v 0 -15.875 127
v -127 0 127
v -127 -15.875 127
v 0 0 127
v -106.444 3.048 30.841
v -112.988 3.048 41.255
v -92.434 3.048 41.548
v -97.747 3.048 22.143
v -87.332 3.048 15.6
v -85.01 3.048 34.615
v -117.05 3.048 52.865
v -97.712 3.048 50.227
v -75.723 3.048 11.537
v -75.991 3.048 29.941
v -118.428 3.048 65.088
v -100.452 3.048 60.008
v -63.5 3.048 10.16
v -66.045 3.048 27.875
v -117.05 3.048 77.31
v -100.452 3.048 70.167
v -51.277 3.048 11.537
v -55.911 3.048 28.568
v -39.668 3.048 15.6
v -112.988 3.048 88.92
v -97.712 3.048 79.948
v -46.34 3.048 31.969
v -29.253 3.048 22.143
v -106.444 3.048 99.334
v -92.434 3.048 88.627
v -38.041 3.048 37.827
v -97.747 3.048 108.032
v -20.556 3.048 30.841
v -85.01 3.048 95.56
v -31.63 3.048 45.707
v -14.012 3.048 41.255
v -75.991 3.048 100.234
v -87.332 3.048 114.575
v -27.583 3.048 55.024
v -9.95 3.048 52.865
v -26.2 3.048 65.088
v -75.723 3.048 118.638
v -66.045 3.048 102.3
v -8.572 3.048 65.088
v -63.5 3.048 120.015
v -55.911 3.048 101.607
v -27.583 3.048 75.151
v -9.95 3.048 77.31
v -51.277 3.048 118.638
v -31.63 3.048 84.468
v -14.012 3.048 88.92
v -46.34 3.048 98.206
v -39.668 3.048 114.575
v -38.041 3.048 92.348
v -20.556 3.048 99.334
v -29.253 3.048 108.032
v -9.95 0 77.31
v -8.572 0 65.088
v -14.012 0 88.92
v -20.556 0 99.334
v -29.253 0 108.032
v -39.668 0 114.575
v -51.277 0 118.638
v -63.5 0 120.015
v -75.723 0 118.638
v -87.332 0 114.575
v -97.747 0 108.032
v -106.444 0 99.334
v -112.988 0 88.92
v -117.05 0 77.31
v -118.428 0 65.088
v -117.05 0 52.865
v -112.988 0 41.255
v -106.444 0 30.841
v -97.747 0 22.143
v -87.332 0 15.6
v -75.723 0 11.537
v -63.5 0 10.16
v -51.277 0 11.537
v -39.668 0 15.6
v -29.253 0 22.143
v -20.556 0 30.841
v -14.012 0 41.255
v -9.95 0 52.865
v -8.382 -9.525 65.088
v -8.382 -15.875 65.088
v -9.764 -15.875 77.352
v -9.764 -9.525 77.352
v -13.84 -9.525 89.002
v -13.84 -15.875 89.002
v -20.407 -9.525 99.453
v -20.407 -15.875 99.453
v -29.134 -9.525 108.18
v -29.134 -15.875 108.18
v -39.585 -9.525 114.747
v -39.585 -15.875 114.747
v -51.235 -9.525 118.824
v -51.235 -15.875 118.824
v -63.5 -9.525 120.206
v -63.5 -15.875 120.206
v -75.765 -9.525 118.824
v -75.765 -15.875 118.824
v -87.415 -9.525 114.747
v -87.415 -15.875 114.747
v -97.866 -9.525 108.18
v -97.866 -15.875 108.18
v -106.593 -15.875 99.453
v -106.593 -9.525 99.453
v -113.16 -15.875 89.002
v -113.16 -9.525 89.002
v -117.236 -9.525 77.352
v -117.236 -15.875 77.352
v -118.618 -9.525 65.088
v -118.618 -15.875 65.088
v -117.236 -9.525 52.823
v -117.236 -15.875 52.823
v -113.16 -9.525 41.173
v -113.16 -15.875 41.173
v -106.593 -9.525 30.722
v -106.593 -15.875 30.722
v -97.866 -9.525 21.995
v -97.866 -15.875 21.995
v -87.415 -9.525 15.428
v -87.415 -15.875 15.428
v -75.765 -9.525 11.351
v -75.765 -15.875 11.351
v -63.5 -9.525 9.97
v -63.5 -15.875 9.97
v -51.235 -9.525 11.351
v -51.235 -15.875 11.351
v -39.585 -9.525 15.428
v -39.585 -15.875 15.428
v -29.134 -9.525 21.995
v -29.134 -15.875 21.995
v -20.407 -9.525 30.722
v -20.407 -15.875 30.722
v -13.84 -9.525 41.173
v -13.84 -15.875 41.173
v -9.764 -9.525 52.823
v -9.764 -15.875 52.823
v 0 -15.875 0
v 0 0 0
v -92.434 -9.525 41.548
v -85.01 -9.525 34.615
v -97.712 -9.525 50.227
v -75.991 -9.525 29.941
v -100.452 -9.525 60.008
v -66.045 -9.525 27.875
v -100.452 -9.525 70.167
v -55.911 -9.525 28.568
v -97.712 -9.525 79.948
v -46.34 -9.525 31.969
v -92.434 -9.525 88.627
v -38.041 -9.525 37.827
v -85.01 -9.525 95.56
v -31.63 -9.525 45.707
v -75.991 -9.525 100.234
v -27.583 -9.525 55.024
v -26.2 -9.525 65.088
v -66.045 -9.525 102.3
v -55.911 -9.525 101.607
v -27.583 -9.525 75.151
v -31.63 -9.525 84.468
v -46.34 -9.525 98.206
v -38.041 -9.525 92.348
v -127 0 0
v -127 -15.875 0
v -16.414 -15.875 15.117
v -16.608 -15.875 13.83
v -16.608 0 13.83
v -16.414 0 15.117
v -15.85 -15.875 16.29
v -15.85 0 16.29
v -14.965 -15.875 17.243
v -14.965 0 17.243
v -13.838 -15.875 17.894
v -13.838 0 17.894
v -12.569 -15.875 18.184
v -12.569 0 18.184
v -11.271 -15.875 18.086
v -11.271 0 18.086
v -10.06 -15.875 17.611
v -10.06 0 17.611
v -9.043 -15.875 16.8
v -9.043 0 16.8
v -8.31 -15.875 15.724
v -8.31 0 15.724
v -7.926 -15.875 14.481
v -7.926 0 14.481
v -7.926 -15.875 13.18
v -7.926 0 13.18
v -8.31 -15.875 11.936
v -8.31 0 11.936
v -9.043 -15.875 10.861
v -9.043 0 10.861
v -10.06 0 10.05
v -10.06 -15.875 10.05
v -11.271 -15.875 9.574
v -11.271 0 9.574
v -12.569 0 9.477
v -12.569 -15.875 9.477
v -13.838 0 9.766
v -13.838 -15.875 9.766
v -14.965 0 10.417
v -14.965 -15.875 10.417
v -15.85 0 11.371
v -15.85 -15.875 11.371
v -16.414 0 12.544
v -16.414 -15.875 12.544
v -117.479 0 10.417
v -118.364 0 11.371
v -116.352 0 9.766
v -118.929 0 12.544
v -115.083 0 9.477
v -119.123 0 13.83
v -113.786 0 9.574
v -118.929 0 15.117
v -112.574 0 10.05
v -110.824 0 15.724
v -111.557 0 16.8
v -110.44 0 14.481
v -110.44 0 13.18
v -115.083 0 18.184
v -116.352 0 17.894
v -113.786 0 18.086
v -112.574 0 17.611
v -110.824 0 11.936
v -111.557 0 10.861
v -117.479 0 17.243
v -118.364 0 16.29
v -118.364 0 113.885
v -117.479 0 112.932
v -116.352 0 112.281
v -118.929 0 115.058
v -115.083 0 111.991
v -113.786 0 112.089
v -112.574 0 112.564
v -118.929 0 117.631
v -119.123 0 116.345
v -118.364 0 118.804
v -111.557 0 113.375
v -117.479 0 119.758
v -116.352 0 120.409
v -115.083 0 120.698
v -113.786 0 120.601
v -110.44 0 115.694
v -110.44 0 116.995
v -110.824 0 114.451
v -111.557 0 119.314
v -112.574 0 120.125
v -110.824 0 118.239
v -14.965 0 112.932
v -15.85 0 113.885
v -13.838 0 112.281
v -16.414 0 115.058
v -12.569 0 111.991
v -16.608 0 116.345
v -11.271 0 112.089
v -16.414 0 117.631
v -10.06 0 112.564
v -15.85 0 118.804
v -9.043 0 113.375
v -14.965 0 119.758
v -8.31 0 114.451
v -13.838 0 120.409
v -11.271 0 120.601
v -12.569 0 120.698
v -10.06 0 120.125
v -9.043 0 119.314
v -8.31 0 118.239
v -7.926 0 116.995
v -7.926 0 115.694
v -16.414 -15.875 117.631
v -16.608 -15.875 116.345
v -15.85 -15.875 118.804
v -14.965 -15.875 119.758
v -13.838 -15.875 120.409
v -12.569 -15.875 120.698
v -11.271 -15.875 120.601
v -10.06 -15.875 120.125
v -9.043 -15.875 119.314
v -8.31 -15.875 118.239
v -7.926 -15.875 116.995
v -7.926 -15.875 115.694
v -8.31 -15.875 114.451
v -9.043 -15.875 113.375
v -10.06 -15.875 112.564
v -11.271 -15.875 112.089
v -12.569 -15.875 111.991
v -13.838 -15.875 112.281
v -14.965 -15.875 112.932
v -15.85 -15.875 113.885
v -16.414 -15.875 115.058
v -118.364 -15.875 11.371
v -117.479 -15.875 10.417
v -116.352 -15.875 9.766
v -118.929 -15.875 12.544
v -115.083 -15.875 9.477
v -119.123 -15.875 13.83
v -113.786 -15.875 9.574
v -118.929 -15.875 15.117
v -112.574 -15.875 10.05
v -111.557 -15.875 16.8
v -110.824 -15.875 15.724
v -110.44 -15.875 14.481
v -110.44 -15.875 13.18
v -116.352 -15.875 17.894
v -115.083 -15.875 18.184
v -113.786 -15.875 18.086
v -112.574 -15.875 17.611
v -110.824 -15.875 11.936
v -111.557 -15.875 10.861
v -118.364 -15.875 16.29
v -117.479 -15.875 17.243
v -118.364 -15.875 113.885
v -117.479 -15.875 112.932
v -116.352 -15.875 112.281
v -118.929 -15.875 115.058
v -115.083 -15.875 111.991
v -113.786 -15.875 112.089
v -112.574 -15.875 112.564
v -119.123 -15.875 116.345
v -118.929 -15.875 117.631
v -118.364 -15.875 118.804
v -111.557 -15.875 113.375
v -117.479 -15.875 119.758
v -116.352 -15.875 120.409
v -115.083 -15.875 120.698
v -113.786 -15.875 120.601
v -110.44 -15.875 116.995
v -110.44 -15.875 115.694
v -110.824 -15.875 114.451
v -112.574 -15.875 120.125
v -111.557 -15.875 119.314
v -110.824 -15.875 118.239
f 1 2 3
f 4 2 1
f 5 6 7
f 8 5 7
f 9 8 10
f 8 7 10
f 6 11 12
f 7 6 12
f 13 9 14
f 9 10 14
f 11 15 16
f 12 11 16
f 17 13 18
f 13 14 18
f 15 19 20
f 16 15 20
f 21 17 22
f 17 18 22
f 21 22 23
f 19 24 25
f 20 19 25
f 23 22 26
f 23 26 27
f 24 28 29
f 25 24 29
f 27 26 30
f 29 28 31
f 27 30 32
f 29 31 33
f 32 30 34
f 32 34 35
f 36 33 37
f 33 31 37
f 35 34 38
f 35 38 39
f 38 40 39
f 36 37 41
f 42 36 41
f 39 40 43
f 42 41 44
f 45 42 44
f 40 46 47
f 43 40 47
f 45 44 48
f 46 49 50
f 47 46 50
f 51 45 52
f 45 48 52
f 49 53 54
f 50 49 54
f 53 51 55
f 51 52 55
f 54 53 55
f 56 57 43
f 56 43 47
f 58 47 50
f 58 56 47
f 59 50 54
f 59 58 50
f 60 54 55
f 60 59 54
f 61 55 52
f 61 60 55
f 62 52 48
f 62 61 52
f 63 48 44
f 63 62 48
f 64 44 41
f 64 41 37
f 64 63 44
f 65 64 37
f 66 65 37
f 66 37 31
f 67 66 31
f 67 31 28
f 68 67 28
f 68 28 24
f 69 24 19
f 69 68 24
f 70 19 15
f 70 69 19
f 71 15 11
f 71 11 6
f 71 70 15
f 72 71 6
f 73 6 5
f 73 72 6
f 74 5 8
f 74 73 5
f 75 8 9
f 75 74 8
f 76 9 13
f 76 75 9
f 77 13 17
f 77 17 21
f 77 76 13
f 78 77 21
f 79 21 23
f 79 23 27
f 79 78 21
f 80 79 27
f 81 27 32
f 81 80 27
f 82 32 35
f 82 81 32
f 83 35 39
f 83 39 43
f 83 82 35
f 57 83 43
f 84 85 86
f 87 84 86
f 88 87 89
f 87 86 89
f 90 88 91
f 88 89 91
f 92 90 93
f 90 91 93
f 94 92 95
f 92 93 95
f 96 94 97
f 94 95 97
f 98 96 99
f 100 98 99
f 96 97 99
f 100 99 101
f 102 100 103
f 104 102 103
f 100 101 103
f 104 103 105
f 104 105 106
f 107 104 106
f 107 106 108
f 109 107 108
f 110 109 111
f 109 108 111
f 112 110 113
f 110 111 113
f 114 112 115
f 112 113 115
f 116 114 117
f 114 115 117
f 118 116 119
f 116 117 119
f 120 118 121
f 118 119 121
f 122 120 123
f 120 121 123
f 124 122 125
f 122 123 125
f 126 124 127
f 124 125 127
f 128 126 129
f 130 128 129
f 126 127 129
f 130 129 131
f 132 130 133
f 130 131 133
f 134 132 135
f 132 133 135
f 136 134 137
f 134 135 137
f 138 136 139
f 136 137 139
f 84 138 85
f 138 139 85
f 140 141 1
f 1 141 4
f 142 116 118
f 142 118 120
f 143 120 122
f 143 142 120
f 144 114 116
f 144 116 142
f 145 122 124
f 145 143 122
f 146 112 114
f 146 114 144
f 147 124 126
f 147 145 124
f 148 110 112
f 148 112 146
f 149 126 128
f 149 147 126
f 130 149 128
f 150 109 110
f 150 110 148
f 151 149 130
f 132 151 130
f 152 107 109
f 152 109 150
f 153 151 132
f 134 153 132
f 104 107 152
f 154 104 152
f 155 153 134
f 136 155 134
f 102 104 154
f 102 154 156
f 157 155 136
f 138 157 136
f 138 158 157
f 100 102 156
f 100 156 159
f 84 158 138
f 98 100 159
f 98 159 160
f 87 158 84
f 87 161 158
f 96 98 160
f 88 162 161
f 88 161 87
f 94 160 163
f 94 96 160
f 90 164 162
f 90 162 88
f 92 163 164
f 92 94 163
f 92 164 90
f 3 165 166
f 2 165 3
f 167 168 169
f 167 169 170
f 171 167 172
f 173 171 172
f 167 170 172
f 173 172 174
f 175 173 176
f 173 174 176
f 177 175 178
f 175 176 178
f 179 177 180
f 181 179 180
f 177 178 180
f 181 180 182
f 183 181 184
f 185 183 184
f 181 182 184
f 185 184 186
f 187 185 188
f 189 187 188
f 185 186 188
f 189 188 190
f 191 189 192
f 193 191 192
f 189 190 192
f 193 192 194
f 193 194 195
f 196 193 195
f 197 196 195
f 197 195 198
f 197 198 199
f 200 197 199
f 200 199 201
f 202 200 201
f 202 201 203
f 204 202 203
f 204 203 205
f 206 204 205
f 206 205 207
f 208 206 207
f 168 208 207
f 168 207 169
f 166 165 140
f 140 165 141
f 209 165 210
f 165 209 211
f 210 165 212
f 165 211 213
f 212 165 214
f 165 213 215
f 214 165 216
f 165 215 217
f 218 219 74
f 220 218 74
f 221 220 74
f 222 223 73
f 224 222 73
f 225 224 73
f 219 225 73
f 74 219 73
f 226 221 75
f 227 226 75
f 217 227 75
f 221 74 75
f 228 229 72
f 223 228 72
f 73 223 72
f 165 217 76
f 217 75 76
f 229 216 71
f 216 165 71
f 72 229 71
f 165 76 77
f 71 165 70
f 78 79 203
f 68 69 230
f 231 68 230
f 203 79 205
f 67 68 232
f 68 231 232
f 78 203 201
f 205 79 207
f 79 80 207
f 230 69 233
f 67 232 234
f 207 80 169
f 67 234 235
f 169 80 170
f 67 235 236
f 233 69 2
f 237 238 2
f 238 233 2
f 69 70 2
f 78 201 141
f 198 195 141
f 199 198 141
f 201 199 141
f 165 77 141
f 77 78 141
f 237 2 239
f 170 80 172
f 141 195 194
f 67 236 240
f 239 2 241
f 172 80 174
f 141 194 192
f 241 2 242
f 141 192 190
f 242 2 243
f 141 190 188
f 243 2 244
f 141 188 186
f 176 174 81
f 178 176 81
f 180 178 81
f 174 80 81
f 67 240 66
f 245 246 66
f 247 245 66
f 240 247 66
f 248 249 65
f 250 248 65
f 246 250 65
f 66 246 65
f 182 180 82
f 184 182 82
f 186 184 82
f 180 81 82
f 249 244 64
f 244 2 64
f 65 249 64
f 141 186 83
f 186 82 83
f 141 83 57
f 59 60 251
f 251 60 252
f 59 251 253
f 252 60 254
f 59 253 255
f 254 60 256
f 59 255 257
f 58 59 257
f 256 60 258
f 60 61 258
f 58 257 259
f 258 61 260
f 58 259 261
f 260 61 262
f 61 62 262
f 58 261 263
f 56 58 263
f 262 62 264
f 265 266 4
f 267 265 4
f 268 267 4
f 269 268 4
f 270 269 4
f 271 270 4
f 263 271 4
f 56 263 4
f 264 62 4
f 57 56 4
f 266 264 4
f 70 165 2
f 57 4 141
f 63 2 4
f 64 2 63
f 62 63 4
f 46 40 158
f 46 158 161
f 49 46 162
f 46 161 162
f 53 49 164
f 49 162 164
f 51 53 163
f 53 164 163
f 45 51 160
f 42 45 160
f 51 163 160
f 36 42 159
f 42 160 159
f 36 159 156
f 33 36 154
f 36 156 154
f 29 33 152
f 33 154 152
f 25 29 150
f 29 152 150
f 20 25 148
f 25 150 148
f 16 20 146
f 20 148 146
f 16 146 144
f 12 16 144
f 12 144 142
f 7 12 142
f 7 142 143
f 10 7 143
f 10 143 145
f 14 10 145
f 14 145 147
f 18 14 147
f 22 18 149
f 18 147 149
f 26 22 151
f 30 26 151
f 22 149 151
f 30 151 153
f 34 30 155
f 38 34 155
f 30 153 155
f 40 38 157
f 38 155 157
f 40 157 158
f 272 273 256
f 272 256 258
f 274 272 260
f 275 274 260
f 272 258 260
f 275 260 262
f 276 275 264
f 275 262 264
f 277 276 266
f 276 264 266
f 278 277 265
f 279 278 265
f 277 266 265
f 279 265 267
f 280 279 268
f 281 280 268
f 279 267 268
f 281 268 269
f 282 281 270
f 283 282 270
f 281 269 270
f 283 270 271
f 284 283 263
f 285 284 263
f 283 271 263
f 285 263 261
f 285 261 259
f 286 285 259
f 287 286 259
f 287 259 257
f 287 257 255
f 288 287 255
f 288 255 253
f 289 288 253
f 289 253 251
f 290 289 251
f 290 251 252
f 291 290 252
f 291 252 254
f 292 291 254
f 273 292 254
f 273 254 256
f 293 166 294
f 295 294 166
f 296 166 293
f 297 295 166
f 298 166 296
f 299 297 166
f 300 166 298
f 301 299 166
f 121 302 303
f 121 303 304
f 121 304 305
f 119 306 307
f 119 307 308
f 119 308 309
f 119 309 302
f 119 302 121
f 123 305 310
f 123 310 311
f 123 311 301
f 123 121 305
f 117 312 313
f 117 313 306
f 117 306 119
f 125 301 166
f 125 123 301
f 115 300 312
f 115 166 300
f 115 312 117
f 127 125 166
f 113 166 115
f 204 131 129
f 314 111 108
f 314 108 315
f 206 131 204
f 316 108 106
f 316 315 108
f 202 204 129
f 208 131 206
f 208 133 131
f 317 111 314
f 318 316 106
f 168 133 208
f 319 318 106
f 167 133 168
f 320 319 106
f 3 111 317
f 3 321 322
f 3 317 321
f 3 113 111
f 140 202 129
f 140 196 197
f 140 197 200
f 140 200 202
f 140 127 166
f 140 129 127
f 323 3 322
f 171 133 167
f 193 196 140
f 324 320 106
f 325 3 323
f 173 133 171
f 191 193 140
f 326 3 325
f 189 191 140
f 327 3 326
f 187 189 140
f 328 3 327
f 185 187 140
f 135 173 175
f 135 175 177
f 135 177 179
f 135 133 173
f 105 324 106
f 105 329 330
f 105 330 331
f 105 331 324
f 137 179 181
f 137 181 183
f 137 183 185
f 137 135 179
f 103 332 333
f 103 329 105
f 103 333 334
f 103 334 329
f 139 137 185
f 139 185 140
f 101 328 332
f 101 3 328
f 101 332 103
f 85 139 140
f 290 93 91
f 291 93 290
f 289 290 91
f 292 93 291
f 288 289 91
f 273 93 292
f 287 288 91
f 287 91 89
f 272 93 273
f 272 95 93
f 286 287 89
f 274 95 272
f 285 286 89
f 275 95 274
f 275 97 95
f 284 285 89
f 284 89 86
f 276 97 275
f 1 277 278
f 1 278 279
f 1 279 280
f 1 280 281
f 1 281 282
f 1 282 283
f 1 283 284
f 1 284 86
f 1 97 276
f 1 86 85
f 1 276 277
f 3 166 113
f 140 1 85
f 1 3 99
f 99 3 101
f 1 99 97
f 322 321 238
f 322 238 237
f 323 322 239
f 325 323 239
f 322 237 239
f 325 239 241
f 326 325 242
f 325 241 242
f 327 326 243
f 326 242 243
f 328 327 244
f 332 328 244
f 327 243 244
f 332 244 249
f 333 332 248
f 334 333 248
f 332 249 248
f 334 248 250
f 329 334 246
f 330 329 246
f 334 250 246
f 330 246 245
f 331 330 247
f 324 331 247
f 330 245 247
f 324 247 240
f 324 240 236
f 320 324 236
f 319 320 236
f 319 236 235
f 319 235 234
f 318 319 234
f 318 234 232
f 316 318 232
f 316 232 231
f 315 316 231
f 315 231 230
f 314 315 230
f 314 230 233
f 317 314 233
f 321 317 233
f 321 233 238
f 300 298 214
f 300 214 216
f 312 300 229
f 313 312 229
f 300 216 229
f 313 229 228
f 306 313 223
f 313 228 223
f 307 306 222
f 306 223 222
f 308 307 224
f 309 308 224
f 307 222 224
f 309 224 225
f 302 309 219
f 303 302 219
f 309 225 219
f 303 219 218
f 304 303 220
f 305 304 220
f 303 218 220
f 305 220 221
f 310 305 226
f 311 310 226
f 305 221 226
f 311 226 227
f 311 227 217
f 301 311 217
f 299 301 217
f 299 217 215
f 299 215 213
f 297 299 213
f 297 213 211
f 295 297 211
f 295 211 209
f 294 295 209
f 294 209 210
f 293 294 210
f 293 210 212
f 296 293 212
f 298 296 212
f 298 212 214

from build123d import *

# Parameters (mm, degrees)
F0_W     = 127
F0_H     = 127
F2_DEPTH = 15.875
F3_R     = 37.2999
F4_DEPTH = 16.002
F5_R     = 55.118
F5_R_2   = 37.2999
F6_DEPTH = 6.35
F7_R     = 54.9275
F7_R_2   = 37.2999
F8_DEPTH = 3.048
F10_D    = 8.73125


# Not quite as in the source:
# - a length typed as a fraction of an inch, garbled in the dataset ("3 / 203.2 mm" for 3/8 in), is restored


with BuildPart() as f2:
    # F0 (on Front) → F2 (new body)
    with BuildSketch(Plane.XZ):
        with Locations((-63.5, 63.5)):
            Rectangle(F0_W, F0_H)
    extrude(amount=F2_DEPTH)

    # F3 (on face) → F4 (cut)
    with BuildSketch(Plane.XZ.offset(15.875)):
        with Locations((-63.5, 65.0875)):
            Circle(F3_R)
    extrude(amount=-F4_DEPTH, mode=Mode.SUBTRACT)

    # F5 (on face) → F6 (cut)
    with BuildSketch(Plane.XZ.offset(15.875)):
        with Locations((-63.5, 65.0875)):
            Circle(F5_R)
        with Locations((-63.5, 65.0875)):
            Circle(F5_R_2, mode=Mode.SUBTRACT)
    extrude(amount=-F6_DEPTH, mode=Mode.SUBTRACT)

    # F7 (on face) → F8 (join)
    with BuildSketch(Plane.XZ):
        with Locations((-63.5, 65.0875)):
            Circle(F7_R)
        with Locations((-63.5, 65.0875)):
            Circle(F7_R_2, mode=Mode.SUBTRACT)
    extrude(amount=-F8_DEPTH)

    # F10 (through all)
    with Locations(Plane.XZ.offset(15.875)):
        with Locations((-114.7572, 116.3447), (-12.2428, 116.3447), (-12.2428, 13.8303), (-114.7572, 13.8303)):
            Hole(F10_D / 2)


solid = f2.part
